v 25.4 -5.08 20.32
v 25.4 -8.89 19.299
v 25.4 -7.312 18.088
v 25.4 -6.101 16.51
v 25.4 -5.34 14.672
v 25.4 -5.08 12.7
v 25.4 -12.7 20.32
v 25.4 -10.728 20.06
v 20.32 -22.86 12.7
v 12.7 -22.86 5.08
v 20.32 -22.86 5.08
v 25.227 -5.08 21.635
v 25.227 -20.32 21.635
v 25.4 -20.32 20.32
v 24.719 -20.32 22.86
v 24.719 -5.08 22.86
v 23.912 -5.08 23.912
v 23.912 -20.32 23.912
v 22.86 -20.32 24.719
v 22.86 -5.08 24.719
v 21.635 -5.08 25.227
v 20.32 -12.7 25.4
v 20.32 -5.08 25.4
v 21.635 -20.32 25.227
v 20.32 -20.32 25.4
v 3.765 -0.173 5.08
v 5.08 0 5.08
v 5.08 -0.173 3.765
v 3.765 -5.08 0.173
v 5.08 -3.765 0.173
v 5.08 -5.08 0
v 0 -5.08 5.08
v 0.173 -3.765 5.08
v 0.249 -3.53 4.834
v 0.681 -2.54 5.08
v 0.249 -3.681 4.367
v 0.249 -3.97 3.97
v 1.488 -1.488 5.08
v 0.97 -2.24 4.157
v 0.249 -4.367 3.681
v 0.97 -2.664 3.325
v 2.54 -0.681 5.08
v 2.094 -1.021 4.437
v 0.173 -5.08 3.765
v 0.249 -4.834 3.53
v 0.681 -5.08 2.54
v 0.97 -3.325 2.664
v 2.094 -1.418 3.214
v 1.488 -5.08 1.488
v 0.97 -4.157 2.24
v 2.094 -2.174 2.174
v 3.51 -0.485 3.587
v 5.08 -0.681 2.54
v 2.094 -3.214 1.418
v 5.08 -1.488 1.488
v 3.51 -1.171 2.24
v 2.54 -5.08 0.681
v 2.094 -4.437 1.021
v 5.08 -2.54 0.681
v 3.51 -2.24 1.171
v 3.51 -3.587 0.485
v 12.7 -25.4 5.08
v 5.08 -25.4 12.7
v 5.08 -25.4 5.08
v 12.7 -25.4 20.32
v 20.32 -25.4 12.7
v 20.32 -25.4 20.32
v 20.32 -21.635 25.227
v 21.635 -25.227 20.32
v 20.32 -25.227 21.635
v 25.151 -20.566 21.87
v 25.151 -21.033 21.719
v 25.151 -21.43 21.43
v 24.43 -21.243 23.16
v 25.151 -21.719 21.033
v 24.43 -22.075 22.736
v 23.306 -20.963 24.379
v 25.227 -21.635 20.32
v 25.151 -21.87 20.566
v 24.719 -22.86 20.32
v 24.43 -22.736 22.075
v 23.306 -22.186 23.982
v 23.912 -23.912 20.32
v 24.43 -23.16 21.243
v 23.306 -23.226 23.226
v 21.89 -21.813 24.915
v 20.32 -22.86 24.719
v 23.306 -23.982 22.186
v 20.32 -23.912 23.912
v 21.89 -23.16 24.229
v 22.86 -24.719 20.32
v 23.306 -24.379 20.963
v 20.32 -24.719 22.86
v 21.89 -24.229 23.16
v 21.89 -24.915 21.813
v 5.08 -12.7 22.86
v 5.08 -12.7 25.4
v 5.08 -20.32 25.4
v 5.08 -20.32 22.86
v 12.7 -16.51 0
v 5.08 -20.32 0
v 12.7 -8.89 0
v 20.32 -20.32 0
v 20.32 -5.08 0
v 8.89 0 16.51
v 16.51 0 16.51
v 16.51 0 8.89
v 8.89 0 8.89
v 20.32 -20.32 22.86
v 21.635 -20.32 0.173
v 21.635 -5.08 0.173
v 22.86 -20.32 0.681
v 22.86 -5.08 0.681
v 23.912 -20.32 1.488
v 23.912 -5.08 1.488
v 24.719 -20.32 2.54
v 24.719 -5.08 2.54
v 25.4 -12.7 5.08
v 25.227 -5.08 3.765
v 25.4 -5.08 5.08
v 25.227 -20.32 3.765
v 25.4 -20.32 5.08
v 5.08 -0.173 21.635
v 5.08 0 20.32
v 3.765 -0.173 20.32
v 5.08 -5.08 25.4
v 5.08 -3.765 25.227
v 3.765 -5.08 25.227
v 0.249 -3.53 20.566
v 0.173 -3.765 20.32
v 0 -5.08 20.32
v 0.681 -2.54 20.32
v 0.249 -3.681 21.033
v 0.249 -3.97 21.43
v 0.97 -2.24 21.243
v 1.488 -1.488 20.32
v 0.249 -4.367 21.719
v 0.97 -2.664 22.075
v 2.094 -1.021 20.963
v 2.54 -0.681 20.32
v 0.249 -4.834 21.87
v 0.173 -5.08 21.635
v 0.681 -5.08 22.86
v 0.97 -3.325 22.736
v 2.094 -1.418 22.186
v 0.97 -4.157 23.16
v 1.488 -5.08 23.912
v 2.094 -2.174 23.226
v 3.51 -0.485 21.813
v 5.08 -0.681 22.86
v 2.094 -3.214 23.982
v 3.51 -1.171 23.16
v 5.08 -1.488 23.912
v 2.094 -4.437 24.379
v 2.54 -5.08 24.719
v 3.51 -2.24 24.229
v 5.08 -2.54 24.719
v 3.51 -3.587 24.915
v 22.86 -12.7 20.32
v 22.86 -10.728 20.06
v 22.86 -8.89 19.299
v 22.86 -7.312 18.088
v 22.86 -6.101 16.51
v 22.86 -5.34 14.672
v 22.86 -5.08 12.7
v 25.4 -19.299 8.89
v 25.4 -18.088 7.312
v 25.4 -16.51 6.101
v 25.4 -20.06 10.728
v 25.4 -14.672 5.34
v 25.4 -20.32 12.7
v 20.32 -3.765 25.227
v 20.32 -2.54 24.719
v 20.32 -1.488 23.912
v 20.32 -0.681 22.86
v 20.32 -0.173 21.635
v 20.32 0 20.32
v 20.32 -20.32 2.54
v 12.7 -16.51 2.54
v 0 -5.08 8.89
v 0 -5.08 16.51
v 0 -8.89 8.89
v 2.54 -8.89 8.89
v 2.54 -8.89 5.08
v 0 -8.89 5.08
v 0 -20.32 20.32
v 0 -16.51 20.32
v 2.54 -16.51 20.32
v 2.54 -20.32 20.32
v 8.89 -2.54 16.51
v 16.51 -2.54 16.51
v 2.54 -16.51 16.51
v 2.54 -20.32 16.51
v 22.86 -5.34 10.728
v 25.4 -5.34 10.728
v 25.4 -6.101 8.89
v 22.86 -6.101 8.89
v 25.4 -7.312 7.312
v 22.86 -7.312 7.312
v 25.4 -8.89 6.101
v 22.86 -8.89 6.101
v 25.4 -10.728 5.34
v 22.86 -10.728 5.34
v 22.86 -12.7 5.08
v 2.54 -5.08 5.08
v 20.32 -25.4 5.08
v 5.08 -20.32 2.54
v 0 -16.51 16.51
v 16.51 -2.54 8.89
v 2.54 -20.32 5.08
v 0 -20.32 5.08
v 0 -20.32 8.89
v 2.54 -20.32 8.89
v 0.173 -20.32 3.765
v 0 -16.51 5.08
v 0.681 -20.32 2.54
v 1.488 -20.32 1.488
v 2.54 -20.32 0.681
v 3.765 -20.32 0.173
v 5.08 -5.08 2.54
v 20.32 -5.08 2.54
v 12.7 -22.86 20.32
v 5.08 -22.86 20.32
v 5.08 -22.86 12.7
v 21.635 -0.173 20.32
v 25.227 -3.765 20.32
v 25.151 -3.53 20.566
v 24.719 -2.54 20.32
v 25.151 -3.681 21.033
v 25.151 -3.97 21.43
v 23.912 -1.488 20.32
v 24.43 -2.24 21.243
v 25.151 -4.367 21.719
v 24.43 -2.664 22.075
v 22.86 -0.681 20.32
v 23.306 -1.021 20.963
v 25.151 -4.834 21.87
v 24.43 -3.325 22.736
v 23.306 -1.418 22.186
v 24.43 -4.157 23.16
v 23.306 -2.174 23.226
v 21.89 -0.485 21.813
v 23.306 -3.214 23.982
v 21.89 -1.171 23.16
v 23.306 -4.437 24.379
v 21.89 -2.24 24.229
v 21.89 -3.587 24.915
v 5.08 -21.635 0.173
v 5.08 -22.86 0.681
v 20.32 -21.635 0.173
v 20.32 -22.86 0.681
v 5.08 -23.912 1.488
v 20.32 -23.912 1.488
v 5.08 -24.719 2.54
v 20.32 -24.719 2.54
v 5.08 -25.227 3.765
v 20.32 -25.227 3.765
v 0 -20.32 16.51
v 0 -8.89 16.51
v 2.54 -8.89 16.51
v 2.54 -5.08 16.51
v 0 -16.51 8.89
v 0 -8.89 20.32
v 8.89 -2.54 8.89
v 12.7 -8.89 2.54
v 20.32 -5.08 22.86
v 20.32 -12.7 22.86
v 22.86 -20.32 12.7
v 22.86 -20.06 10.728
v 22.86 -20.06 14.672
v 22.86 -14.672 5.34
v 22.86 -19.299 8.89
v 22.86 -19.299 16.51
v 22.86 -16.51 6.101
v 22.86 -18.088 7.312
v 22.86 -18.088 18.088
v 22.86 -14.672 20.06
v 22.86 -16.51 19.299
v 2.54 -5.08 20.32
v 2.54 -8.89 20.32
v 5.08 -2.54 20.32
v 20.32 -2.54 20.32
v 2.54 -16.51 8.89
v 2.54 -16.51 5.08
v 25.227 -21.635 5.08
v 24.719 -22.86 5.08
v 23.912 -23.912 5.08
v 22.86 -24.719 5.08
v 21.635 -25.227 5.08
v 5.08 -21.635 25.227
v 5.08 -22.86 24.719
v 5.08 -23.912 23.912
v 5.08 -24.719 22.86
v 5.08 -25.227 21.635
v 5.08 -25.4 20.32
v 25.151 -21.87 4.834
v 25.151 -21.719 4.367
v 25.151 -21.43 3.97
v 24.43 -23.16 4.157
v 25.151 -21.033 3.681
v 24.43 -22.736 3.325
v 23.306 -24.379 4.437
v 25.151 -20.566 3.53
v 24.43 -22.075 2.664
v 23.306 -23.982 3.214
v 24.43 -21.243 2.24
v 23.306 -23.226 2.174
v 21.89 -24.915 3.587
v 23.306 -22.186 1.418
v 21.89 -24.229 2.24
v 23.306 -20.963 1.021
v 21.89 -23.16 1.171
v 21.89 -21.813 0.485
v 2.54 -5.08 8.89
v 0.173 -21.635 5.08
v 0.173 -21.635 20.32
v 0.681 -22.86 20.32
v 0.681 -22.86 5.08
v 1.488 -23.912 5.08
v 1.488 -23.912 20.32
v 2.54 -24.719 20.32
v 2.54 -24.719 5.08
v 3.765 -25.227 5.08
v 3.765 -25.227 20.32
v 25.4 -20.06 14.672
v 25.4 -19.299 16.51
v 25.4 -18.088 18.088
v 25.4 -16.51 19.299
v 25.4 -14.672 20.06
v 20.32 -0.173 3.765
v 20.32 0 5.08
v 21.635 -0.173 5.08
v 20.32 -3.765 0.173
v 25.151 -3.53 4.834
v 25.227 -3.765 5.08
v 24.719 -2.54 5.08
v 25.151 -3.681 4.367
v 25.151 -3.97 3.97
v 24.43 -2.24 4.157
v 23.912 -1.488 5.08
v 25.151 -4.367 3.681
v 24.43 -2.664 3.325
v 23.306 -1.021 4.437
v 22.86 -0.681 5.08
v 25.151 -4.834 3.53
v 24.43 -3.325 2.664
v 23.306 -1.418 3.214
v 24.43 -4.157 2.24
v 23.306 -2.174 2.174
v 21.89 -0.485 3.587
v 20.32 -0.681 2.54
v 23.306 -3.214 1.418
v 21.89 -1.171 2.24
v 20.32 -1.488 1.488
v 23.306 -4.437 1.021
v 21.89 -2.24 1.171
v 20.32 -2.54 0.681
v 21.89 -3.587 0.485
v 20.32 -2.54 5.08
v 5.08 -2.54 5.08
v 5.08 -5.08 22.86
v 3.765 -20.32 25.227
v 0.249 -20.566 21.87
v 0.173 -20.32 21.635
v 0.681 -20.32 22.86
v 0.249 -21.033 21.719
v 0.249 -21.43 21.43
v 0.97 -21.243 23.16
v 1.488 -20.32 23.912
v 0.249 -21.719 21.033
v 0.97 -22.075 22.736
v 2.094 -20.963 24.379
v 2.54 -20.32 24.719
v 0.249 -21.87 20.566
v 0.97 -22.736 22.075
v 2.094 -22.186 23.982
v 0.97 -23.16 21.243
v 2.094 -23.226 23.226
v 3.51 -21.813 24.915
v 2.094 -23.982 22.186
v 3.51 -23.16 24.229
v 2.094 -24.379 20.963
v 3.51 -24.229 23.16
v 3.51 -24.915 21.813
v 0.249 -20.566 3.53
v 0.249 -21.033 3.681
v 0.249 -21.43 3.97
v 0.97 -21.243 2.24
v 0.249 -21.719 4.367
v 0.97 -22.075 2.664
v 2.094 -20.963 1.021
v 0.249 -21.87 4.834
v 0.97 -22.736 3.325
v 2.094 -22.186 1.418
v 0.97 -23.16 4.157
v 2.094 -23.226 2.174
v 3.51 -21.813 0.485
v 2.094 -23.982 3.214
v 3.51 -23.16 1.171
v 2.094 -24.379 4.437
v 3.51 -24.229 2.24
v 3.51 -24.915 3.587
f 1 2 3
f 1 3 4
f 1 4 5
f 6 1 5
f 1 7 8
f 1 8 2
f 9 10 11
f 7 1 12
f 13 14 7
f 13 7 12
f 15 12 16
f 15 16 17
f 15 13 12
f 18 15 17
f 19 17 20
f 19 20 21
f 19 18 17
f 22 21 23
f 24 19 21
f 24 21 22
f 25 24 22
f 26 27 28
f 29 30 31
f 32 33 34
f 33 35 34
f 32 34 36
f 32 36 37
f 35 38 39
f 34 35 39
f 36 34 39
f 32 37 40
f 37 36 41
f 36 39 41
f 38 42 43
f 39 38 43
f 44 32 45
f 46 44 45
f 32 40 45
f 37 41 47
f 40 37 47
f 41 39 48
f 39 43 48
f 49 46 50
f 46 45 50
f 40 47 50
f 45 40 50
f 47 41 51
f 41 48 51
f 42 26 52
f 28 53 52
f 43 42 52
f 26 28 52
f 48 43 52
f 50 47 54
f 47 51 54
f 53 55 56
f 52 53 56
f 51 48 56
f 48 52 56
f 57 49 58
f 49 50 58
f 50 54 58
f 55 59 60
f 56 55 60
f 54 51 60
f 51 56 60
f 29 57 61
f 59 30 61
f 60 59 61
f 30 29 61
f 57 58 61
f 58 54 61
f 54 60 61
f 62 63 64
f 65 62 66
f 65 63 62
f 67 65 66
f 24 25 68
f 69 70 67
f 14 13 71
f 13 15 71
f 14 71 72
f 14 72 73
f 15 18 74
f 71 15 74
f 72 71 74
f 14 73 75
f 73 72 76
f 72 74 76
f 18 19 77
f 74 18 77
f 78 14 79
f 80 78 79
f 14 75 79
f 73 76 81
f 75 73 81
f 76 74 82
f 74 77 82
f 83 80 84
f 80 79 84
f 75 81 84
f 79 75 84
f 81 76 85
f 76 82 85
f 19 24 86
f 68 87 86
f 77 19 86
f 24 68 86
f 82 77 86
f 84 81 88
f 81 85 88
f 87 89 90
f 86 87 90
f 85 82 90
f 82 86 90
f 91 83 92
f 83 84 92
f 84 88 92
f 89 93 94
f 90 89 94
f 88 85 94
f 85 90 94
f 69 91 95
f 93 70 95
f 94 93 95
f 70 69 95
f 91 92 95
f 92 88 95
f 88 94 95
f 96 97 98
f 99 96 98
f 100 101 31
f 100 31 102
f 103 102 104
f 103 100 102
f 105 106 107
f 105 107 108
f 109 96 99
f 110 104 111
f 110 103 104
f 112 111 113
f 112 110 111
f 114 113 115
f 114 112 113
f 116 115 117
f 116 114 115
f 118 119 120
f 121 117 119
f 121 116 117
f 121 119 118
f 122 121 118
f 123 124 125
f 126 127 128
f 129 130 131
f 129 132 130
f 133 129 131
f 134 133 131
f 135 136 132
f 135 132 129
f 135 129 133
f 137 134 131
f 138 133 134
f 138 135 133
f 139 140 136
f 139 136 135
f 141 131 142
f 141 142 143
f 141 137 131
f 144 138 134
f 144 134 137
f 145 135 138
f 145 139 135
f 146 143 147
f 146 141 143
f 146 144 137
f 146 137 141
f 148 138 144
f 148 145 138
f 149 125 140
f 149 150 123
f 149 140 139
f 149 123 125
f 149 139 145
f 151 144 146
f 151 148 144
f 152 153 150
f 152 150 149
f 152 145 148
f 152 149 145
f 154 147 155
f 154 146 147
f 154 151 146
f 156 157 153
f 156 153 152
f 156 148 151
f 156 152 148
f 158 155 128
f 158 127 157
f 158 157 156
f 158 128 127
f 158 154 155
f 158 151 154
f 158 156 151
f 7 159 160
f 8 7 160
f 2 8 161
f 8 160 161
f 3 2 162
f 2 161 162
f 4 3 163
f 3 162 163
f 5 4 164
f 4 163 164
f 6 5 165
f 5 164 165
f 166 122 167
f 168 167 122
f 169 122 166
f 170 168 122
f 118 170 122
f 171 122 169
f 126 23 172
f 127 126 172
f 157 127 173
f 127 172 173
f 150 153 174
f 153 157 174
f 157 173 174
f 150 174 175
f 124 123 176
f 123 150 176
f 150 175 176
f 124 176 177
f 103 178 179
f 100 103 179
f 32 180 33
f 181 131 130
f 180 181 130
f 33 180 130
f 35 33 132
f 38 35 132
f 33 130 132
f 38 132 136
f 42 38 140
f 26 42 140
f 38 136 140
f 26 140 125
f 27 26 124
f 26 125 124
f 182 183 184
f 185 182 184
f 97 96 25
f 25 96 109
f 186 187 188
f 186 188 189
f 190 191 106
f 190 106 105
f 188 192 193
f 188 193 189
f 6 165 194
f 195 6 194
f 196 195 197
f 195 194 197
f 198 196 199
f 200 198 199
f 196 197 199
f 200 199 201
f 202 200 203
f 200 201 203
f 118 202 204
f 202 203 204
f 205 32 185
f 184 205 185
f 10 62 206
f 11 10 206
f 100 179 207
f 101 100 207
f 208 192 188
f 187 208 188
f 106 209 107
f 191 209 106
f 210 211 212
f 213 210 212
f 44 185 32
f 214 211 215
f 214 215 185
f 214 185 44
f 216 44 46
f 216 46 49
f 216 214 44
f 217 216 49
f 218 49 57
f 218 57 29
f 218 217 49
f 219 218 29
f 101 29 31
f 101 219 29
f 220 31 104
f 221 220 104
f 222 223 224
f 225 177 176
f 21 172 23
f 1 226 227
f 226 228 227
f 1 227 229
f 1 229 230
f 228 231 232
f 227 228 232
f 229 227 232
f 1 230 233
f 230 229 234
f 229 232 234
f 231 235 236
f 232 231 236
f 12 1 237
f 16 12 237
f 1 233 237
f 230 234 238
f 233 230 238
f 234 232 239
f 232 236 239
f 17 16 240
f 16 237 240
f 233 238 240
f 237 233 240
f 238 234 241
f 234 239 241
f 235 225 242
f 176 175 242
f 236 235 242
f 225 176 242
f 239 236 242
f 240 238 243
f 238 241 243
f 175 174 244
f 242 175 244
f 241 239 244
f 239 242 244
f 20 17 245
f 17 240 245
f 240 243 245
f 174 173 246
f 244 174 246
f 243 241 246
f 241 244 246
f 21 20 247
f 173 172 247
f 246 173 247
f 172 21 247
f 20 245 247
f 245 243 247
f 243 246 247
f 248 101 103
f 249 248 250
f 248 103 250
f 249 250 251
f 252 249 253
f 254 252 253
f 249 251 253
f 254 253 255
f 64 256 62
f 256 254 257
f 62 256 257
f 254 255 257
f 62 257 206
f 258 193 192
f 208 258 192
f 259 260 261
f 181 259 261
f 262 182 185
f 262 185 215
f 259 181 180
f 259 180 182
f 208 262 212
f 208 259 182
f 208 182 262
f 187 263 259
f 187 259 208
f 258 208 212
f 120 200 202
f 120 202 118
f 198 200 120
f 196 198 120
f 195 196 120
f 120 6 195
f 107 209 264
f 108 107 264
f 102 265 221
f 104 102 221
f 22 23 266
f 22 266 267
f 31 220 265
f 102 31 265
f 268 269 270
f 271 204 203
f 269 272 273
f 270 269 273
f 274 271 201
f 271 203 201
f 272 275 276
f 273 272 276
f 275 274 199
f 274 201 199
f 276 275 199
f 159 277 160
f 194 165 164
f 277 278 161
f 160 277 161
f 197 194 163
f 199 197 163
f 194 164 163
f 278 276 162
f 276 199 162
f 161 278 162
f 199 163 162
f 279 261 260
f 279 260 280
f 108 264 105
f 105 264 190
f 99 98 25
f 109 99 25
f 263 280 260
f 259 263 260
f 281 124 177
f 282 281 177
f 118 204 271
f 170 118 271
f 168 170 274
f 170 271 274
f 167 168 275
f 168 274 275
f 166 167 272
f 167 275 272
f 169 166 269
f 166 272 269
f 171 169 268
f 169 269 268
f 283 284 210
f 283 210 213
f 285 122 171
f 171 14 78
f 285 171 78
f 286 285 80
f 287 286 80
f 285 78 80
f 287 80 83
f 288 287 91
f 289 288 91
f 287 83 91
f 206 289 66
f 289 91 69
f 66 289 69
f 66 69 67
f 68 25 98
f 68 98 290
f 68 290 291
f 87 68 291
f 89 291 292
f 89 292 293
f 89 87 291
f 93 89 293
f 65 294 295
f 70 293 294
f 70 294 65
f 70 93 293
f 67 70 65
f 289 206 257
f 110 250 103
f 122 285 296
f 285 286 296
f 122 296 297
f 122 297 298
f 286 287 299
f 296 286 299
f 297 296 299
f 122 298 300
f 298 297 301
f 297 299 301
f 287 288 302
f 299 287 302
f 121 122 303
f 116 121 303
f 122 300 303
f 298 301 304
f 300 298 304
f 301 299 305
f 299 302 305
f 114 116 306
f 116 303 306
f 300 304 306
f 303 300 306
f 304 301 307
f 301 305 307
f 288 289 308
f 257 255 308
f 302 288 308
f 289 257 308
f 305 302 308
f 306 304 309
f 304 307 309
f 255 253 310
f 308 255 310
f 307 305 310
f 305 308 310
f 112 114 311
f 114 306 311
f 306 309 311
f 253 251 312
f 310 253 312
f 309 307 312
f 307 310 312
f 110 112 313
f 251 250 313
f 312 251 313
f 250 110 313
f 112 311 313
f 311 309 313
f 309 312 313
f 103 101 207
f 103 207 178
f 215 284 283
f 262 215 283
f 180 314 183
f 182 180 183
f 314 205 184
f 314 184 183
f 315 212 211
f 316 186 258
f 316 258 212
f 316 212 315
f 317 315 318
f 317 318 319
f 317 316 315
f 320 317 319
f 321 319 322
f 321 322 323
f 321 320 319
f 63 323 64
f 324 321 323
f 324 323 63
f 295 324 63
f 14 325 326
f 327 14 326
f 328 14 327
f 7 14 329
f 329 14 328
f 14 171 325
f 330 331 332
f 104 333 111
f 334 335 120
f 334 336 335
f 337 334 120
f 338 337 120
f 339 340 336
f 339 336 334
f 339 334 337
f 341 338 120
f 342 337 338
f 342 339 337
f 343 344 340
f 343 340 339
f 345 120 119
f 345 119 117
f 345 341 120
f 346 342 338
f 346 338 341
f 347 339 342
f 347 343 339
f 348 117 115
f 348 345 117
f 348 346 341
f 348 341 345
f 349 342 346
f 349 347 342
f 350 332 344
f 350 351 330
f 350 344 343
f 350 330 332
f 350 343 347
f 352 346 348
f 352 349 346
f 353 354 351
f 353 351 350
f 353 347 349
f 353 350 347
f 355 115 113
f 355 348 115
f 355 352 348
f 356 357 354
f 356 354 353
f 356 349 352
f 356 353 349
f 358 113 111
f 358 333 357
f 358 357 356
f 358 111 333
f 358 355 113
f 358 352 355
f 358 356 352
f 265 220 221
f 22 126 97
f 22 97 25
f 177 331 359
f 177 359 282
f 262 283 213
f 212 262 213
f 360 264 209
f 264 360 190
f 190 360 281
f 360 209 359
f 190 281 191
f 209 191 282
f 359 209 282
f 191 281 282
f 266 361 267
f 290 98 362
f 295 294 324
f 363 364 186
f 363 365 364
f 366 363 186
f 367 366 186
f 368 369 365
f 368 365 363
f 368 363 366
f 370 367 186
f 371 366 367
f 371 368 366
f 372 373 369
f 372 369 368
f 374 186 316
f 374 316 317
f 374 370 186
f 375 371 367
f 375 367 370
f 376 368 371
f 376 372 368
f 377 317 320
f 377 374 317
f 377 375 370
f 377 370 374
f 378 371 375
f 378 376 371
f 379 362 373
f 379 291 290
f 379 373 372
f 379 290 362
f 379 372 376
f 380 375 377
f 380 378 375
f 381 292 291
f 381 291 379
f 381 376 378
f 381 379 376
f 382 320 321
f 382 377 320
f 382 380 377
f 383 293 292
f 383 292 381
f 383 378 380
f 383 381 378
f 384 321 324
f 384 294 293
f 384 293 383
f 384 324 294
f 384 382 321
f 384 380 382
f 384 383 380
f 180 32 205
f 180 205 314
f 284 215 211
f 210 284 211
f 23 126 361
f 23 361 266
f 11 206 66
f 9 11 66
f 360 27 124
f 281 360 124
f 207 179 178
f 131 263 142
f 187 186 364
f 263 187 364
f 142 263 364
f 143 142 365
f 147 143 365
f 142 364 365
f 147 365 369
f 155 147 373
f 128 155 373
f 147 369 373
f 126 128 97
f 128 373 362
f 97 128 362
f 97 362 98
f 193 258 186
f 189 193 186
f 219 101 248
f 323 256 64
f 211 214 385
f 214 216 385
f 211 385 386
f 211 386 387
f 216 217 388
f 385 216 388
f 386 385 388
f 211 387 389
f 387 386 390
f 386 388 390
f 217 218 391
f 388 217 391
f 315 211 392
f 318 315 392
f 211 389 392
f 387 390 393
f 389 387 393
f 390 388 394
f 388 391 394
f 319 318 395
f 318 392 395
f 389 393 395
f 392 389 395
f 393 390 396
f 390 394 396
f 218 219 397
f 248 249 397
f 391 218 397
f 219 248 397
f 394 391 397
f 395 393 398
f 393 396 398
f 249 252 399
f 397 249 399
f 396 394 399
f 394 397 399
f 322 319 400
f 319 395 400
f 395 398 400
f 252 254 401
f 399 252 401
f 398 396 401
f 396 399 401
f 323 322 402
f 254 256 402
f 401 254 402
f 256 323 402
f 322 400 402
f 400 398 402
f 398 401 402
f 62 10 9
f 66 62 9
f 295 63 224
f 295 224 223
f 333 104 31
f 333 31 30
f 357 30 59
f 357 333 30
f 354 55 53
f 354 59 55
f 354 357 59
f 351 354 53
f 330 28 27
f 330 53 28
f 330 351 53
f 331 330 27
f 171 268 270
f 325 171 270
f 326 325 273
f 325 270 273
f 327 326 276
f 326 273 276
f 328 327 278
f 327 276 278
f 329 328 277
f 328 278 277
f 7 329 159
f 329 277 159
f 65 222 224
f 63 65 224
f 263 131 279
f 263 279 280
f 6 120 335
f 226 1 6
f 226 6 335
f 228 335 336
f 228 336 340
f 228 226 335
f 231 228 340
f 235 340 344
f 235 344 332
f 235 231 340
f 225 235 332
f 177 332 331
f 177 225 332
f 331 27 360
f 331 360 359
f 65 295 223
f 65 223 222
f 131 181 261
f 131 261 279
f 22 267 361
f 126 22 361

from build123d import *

# Parameters (mm, degrees)
F0_W      = 25.4
F0_H      = 25.4
F1_DEPTH  = 25.4
F2_R      = 5.08
F3_DEPTH  = 2.54
F4_DEPTH  = 2.54
F5_DEPTH  = 2.54
F6_DEPTH  = 2.54
F7_DEPTH  = 2.54
F8_DEPTH  = 2.54
F15_DEPTH = 2.54
F11_W     = 7.62
F11_H     = 7.62
F16_DEPTH = 2.54
F17_DEPTH = 2.54
F18_DEPTH = 2.54
F19_DEPTH = 2.54
F20_DEPTH = 2.54


with BuildPart() as f1:
    # F0 (on Front) → F1 (new body)
    with BuildSketch(Plane.XZ):
        with Locations((12.7, 12.7)):
            Rectangle(F0_W, F0_H)
    extrude(amount=F1_DEPTH)

    # F2
    f2_edges = [f1.edges().sort_by_distance(p)[0] for p in [
        (12.7, -25.4, 25.4),
        (12.7, -25.4, 0),
        (12.7, 0, 25.4),
        (12.7, 0, 0),
        (25.4, 0, 12.7),
        (0, 0, 12.7),
        (0, -12.7, 25.4),
        (0, -12.7, 0),
        (25.4, -12.7, 25.4),
        (25.4, -25.4, 12.7),
        (0, -25.4, 12.7),
        (25.4, -12.7, 0),
    ]]
    fillet(f2_edges, radius=F2_R)

    # F3 (cut): a face of the model
    f3_faces = [f1.faces().sort_by_distance(p)[0] for p in [
        (12.7, -25.4, 12.7),
    ]]
    extrude(f3_faces, amount=-F3_DEPTH, mode=Mode.SUBTRACT)

    # F4 (cut): a face of the model
    f4_faces = [f1.faces().sort_by_distance(p)[0] for p in [
        (0, -12.7, 12.7),
    ]]
    extrude(f4_faces, amount=-F4_DEPTH, mode=Mode.SUBTRACT)

    # F5 (cut): a face of the model
    f5_faces = [f1.faces().sort_by_distance(p)[0] for p in [
        (12.7, -12.7, 25.4),
    ]]
    extrude(f5_faces, amount=-F5_DEPTH, mode=Mode.SUBTRACT)

    # F6 (cut): a face of the model
    f6_faces = [f1.faces().sort_by_distance(p)[0] for p in [
        (25.4, -12.7, 12.7),
    ]]
    extrude(f6_faces, amount=-F6_DEPTH, mode=Mode.SUBTRACT)

    # F7 (cut): a face of the model
    f7_faces = [f1.faces().sort_by_distance(p)[0] for p in [
        (12.7, -12.7, 0),
    ]]
    extrude(f7_faces, amount=-F7_DEPTH, mode=Mode.SUBTRACT)

    # F8 (cut): a face of the model
    f8_faces = [f1.faces().sort_by_distance(p)[0] for p in [
        (12.7, 0, 12.7),
    ]]
    extrude(f8_faces, amount=-F8_DEPTH, mode=Mode.SUBTRACT)

    # F14 (on face) → F15 (join)
    with BuildSketch(Plane.XY.offset(22.86)):
        Polygon((20.32, -20.32), (20.32, -12.7), (5.08, -5.08), (5.08, -12.7), align=None)
    extrude(amount=F15_DEPTH)

    # F11 (on face) → F16 (join)
    with BuildSketch(Plane(origin=(0, -2.54, 0), x_dir=(-1, 0, 0), z_dir=(0, 1, 0))):
        with Locations((-12.7, 12.7)):
            Rectangle(F11_W, F11_H)
    extrude(amount=F16_DEPTH)

    # F9 (on face) → F17 (join)
    with BuildSketch(Plane.XZ.offset(22.86)):
        Polygon((12.7, 5.08), (5.08, 12.7), (5.08, 5.08), align=None)
        Polygon((12.7, 20.32), (5.08, 12.7), (12.7, 5.08), (20.32, 12.7), align=None)
        Polygon((20.32, 20.32), (12.7, 20.32), (20.32, 12.7), align=None)
    extrude(amount=F17_DEPTH)

    # F12 (on face) → F18 (join)
    with BuildSketch(Plane(origin=(2.54, 0, 0), x_dir=(0, -1, 0), z_dir=(-1, 0, 0))):
        Polygon((16.51, 20.32), (12.7, 20.32), (8.89, 20.32), (8.89, 16.51), (5.08, 16.51), (5.08, 12.7), (5.08, 8.89), (8.89, 8.89), (8.89, 5.08), (12.7, 5.08), (16.51, 5.08), (16.51, 8.89), (20.32, 8.89), (20.32, 12.7), (20.32, 16.51), (16.51, 16.51), align=None)
    extrude(amount=F18_DEPTH)

    # F13 (on face) → F19 (join)
    with BuildSketch(Plane(origin=(0, 0, 2.54), x_dir=(1, 0, 0), z_dir=(0, 0, -1))):
        Polygon((12.7, 8.89), (20.32, 5.08), (20.32, 20.32), (12.7, 16.51), (5.08, 12.7), align=None)
        Polygon((5.08, 5.08), (12.7, 8.89), (5.08, 12.7), align=None)
        Polygon((5.08, 20.32), (5.08, 12.7), (12.7, 16.51), align=None)
    extrude(amount=F19_DEPTH)

    # F10 (on face) → F20 (join)
    with BuildSketch(Plane.YZ.offset(22.86)):
        with BuildLine():
            Line((-5.08, 5.08), (-5.08, 12.7))
            ThreePointArc((-5.08, 12.7), (-7.3118463274, 7.3118463274), (-12.7, 5.08))
            Line((-12.7, 5.08), (-5.08, 5.08))
        make_face()
        with BuildLine():
            ThreePointArc((-12.7, 20.32), (-7.3118463274, 18.0881536726), (-5.08, 12.7))
            Line((-5.08, 12.7), (-5.08, 20.32))
            Line((-5.08, 20.32), (-12.7, 20.32))
        make_face()
        with BuildLine():
            ThreePointArc((-20.32, 12.7), (-18.0881536726, 18.0881536726), (-12.7, 20.32))
            Line((-12.7, 20.32), (-20.32, 20.32))
            Line((-20.32, 20.32), (-20.32, 12.7))
        make_face()
        with BuildLine():
            Line((-20.32, 5.08), (-12.7, 5.08))
            ThreePointArc((-12.7, 5.08), (-18.0881536726, 7.3118463274), (-20.32, 12.7))
            Line((-20.32, 12.7), (-20.32, 5.08))
        make_face()
    extrude(amount=F20_DEPTH)


solid = f1.part
